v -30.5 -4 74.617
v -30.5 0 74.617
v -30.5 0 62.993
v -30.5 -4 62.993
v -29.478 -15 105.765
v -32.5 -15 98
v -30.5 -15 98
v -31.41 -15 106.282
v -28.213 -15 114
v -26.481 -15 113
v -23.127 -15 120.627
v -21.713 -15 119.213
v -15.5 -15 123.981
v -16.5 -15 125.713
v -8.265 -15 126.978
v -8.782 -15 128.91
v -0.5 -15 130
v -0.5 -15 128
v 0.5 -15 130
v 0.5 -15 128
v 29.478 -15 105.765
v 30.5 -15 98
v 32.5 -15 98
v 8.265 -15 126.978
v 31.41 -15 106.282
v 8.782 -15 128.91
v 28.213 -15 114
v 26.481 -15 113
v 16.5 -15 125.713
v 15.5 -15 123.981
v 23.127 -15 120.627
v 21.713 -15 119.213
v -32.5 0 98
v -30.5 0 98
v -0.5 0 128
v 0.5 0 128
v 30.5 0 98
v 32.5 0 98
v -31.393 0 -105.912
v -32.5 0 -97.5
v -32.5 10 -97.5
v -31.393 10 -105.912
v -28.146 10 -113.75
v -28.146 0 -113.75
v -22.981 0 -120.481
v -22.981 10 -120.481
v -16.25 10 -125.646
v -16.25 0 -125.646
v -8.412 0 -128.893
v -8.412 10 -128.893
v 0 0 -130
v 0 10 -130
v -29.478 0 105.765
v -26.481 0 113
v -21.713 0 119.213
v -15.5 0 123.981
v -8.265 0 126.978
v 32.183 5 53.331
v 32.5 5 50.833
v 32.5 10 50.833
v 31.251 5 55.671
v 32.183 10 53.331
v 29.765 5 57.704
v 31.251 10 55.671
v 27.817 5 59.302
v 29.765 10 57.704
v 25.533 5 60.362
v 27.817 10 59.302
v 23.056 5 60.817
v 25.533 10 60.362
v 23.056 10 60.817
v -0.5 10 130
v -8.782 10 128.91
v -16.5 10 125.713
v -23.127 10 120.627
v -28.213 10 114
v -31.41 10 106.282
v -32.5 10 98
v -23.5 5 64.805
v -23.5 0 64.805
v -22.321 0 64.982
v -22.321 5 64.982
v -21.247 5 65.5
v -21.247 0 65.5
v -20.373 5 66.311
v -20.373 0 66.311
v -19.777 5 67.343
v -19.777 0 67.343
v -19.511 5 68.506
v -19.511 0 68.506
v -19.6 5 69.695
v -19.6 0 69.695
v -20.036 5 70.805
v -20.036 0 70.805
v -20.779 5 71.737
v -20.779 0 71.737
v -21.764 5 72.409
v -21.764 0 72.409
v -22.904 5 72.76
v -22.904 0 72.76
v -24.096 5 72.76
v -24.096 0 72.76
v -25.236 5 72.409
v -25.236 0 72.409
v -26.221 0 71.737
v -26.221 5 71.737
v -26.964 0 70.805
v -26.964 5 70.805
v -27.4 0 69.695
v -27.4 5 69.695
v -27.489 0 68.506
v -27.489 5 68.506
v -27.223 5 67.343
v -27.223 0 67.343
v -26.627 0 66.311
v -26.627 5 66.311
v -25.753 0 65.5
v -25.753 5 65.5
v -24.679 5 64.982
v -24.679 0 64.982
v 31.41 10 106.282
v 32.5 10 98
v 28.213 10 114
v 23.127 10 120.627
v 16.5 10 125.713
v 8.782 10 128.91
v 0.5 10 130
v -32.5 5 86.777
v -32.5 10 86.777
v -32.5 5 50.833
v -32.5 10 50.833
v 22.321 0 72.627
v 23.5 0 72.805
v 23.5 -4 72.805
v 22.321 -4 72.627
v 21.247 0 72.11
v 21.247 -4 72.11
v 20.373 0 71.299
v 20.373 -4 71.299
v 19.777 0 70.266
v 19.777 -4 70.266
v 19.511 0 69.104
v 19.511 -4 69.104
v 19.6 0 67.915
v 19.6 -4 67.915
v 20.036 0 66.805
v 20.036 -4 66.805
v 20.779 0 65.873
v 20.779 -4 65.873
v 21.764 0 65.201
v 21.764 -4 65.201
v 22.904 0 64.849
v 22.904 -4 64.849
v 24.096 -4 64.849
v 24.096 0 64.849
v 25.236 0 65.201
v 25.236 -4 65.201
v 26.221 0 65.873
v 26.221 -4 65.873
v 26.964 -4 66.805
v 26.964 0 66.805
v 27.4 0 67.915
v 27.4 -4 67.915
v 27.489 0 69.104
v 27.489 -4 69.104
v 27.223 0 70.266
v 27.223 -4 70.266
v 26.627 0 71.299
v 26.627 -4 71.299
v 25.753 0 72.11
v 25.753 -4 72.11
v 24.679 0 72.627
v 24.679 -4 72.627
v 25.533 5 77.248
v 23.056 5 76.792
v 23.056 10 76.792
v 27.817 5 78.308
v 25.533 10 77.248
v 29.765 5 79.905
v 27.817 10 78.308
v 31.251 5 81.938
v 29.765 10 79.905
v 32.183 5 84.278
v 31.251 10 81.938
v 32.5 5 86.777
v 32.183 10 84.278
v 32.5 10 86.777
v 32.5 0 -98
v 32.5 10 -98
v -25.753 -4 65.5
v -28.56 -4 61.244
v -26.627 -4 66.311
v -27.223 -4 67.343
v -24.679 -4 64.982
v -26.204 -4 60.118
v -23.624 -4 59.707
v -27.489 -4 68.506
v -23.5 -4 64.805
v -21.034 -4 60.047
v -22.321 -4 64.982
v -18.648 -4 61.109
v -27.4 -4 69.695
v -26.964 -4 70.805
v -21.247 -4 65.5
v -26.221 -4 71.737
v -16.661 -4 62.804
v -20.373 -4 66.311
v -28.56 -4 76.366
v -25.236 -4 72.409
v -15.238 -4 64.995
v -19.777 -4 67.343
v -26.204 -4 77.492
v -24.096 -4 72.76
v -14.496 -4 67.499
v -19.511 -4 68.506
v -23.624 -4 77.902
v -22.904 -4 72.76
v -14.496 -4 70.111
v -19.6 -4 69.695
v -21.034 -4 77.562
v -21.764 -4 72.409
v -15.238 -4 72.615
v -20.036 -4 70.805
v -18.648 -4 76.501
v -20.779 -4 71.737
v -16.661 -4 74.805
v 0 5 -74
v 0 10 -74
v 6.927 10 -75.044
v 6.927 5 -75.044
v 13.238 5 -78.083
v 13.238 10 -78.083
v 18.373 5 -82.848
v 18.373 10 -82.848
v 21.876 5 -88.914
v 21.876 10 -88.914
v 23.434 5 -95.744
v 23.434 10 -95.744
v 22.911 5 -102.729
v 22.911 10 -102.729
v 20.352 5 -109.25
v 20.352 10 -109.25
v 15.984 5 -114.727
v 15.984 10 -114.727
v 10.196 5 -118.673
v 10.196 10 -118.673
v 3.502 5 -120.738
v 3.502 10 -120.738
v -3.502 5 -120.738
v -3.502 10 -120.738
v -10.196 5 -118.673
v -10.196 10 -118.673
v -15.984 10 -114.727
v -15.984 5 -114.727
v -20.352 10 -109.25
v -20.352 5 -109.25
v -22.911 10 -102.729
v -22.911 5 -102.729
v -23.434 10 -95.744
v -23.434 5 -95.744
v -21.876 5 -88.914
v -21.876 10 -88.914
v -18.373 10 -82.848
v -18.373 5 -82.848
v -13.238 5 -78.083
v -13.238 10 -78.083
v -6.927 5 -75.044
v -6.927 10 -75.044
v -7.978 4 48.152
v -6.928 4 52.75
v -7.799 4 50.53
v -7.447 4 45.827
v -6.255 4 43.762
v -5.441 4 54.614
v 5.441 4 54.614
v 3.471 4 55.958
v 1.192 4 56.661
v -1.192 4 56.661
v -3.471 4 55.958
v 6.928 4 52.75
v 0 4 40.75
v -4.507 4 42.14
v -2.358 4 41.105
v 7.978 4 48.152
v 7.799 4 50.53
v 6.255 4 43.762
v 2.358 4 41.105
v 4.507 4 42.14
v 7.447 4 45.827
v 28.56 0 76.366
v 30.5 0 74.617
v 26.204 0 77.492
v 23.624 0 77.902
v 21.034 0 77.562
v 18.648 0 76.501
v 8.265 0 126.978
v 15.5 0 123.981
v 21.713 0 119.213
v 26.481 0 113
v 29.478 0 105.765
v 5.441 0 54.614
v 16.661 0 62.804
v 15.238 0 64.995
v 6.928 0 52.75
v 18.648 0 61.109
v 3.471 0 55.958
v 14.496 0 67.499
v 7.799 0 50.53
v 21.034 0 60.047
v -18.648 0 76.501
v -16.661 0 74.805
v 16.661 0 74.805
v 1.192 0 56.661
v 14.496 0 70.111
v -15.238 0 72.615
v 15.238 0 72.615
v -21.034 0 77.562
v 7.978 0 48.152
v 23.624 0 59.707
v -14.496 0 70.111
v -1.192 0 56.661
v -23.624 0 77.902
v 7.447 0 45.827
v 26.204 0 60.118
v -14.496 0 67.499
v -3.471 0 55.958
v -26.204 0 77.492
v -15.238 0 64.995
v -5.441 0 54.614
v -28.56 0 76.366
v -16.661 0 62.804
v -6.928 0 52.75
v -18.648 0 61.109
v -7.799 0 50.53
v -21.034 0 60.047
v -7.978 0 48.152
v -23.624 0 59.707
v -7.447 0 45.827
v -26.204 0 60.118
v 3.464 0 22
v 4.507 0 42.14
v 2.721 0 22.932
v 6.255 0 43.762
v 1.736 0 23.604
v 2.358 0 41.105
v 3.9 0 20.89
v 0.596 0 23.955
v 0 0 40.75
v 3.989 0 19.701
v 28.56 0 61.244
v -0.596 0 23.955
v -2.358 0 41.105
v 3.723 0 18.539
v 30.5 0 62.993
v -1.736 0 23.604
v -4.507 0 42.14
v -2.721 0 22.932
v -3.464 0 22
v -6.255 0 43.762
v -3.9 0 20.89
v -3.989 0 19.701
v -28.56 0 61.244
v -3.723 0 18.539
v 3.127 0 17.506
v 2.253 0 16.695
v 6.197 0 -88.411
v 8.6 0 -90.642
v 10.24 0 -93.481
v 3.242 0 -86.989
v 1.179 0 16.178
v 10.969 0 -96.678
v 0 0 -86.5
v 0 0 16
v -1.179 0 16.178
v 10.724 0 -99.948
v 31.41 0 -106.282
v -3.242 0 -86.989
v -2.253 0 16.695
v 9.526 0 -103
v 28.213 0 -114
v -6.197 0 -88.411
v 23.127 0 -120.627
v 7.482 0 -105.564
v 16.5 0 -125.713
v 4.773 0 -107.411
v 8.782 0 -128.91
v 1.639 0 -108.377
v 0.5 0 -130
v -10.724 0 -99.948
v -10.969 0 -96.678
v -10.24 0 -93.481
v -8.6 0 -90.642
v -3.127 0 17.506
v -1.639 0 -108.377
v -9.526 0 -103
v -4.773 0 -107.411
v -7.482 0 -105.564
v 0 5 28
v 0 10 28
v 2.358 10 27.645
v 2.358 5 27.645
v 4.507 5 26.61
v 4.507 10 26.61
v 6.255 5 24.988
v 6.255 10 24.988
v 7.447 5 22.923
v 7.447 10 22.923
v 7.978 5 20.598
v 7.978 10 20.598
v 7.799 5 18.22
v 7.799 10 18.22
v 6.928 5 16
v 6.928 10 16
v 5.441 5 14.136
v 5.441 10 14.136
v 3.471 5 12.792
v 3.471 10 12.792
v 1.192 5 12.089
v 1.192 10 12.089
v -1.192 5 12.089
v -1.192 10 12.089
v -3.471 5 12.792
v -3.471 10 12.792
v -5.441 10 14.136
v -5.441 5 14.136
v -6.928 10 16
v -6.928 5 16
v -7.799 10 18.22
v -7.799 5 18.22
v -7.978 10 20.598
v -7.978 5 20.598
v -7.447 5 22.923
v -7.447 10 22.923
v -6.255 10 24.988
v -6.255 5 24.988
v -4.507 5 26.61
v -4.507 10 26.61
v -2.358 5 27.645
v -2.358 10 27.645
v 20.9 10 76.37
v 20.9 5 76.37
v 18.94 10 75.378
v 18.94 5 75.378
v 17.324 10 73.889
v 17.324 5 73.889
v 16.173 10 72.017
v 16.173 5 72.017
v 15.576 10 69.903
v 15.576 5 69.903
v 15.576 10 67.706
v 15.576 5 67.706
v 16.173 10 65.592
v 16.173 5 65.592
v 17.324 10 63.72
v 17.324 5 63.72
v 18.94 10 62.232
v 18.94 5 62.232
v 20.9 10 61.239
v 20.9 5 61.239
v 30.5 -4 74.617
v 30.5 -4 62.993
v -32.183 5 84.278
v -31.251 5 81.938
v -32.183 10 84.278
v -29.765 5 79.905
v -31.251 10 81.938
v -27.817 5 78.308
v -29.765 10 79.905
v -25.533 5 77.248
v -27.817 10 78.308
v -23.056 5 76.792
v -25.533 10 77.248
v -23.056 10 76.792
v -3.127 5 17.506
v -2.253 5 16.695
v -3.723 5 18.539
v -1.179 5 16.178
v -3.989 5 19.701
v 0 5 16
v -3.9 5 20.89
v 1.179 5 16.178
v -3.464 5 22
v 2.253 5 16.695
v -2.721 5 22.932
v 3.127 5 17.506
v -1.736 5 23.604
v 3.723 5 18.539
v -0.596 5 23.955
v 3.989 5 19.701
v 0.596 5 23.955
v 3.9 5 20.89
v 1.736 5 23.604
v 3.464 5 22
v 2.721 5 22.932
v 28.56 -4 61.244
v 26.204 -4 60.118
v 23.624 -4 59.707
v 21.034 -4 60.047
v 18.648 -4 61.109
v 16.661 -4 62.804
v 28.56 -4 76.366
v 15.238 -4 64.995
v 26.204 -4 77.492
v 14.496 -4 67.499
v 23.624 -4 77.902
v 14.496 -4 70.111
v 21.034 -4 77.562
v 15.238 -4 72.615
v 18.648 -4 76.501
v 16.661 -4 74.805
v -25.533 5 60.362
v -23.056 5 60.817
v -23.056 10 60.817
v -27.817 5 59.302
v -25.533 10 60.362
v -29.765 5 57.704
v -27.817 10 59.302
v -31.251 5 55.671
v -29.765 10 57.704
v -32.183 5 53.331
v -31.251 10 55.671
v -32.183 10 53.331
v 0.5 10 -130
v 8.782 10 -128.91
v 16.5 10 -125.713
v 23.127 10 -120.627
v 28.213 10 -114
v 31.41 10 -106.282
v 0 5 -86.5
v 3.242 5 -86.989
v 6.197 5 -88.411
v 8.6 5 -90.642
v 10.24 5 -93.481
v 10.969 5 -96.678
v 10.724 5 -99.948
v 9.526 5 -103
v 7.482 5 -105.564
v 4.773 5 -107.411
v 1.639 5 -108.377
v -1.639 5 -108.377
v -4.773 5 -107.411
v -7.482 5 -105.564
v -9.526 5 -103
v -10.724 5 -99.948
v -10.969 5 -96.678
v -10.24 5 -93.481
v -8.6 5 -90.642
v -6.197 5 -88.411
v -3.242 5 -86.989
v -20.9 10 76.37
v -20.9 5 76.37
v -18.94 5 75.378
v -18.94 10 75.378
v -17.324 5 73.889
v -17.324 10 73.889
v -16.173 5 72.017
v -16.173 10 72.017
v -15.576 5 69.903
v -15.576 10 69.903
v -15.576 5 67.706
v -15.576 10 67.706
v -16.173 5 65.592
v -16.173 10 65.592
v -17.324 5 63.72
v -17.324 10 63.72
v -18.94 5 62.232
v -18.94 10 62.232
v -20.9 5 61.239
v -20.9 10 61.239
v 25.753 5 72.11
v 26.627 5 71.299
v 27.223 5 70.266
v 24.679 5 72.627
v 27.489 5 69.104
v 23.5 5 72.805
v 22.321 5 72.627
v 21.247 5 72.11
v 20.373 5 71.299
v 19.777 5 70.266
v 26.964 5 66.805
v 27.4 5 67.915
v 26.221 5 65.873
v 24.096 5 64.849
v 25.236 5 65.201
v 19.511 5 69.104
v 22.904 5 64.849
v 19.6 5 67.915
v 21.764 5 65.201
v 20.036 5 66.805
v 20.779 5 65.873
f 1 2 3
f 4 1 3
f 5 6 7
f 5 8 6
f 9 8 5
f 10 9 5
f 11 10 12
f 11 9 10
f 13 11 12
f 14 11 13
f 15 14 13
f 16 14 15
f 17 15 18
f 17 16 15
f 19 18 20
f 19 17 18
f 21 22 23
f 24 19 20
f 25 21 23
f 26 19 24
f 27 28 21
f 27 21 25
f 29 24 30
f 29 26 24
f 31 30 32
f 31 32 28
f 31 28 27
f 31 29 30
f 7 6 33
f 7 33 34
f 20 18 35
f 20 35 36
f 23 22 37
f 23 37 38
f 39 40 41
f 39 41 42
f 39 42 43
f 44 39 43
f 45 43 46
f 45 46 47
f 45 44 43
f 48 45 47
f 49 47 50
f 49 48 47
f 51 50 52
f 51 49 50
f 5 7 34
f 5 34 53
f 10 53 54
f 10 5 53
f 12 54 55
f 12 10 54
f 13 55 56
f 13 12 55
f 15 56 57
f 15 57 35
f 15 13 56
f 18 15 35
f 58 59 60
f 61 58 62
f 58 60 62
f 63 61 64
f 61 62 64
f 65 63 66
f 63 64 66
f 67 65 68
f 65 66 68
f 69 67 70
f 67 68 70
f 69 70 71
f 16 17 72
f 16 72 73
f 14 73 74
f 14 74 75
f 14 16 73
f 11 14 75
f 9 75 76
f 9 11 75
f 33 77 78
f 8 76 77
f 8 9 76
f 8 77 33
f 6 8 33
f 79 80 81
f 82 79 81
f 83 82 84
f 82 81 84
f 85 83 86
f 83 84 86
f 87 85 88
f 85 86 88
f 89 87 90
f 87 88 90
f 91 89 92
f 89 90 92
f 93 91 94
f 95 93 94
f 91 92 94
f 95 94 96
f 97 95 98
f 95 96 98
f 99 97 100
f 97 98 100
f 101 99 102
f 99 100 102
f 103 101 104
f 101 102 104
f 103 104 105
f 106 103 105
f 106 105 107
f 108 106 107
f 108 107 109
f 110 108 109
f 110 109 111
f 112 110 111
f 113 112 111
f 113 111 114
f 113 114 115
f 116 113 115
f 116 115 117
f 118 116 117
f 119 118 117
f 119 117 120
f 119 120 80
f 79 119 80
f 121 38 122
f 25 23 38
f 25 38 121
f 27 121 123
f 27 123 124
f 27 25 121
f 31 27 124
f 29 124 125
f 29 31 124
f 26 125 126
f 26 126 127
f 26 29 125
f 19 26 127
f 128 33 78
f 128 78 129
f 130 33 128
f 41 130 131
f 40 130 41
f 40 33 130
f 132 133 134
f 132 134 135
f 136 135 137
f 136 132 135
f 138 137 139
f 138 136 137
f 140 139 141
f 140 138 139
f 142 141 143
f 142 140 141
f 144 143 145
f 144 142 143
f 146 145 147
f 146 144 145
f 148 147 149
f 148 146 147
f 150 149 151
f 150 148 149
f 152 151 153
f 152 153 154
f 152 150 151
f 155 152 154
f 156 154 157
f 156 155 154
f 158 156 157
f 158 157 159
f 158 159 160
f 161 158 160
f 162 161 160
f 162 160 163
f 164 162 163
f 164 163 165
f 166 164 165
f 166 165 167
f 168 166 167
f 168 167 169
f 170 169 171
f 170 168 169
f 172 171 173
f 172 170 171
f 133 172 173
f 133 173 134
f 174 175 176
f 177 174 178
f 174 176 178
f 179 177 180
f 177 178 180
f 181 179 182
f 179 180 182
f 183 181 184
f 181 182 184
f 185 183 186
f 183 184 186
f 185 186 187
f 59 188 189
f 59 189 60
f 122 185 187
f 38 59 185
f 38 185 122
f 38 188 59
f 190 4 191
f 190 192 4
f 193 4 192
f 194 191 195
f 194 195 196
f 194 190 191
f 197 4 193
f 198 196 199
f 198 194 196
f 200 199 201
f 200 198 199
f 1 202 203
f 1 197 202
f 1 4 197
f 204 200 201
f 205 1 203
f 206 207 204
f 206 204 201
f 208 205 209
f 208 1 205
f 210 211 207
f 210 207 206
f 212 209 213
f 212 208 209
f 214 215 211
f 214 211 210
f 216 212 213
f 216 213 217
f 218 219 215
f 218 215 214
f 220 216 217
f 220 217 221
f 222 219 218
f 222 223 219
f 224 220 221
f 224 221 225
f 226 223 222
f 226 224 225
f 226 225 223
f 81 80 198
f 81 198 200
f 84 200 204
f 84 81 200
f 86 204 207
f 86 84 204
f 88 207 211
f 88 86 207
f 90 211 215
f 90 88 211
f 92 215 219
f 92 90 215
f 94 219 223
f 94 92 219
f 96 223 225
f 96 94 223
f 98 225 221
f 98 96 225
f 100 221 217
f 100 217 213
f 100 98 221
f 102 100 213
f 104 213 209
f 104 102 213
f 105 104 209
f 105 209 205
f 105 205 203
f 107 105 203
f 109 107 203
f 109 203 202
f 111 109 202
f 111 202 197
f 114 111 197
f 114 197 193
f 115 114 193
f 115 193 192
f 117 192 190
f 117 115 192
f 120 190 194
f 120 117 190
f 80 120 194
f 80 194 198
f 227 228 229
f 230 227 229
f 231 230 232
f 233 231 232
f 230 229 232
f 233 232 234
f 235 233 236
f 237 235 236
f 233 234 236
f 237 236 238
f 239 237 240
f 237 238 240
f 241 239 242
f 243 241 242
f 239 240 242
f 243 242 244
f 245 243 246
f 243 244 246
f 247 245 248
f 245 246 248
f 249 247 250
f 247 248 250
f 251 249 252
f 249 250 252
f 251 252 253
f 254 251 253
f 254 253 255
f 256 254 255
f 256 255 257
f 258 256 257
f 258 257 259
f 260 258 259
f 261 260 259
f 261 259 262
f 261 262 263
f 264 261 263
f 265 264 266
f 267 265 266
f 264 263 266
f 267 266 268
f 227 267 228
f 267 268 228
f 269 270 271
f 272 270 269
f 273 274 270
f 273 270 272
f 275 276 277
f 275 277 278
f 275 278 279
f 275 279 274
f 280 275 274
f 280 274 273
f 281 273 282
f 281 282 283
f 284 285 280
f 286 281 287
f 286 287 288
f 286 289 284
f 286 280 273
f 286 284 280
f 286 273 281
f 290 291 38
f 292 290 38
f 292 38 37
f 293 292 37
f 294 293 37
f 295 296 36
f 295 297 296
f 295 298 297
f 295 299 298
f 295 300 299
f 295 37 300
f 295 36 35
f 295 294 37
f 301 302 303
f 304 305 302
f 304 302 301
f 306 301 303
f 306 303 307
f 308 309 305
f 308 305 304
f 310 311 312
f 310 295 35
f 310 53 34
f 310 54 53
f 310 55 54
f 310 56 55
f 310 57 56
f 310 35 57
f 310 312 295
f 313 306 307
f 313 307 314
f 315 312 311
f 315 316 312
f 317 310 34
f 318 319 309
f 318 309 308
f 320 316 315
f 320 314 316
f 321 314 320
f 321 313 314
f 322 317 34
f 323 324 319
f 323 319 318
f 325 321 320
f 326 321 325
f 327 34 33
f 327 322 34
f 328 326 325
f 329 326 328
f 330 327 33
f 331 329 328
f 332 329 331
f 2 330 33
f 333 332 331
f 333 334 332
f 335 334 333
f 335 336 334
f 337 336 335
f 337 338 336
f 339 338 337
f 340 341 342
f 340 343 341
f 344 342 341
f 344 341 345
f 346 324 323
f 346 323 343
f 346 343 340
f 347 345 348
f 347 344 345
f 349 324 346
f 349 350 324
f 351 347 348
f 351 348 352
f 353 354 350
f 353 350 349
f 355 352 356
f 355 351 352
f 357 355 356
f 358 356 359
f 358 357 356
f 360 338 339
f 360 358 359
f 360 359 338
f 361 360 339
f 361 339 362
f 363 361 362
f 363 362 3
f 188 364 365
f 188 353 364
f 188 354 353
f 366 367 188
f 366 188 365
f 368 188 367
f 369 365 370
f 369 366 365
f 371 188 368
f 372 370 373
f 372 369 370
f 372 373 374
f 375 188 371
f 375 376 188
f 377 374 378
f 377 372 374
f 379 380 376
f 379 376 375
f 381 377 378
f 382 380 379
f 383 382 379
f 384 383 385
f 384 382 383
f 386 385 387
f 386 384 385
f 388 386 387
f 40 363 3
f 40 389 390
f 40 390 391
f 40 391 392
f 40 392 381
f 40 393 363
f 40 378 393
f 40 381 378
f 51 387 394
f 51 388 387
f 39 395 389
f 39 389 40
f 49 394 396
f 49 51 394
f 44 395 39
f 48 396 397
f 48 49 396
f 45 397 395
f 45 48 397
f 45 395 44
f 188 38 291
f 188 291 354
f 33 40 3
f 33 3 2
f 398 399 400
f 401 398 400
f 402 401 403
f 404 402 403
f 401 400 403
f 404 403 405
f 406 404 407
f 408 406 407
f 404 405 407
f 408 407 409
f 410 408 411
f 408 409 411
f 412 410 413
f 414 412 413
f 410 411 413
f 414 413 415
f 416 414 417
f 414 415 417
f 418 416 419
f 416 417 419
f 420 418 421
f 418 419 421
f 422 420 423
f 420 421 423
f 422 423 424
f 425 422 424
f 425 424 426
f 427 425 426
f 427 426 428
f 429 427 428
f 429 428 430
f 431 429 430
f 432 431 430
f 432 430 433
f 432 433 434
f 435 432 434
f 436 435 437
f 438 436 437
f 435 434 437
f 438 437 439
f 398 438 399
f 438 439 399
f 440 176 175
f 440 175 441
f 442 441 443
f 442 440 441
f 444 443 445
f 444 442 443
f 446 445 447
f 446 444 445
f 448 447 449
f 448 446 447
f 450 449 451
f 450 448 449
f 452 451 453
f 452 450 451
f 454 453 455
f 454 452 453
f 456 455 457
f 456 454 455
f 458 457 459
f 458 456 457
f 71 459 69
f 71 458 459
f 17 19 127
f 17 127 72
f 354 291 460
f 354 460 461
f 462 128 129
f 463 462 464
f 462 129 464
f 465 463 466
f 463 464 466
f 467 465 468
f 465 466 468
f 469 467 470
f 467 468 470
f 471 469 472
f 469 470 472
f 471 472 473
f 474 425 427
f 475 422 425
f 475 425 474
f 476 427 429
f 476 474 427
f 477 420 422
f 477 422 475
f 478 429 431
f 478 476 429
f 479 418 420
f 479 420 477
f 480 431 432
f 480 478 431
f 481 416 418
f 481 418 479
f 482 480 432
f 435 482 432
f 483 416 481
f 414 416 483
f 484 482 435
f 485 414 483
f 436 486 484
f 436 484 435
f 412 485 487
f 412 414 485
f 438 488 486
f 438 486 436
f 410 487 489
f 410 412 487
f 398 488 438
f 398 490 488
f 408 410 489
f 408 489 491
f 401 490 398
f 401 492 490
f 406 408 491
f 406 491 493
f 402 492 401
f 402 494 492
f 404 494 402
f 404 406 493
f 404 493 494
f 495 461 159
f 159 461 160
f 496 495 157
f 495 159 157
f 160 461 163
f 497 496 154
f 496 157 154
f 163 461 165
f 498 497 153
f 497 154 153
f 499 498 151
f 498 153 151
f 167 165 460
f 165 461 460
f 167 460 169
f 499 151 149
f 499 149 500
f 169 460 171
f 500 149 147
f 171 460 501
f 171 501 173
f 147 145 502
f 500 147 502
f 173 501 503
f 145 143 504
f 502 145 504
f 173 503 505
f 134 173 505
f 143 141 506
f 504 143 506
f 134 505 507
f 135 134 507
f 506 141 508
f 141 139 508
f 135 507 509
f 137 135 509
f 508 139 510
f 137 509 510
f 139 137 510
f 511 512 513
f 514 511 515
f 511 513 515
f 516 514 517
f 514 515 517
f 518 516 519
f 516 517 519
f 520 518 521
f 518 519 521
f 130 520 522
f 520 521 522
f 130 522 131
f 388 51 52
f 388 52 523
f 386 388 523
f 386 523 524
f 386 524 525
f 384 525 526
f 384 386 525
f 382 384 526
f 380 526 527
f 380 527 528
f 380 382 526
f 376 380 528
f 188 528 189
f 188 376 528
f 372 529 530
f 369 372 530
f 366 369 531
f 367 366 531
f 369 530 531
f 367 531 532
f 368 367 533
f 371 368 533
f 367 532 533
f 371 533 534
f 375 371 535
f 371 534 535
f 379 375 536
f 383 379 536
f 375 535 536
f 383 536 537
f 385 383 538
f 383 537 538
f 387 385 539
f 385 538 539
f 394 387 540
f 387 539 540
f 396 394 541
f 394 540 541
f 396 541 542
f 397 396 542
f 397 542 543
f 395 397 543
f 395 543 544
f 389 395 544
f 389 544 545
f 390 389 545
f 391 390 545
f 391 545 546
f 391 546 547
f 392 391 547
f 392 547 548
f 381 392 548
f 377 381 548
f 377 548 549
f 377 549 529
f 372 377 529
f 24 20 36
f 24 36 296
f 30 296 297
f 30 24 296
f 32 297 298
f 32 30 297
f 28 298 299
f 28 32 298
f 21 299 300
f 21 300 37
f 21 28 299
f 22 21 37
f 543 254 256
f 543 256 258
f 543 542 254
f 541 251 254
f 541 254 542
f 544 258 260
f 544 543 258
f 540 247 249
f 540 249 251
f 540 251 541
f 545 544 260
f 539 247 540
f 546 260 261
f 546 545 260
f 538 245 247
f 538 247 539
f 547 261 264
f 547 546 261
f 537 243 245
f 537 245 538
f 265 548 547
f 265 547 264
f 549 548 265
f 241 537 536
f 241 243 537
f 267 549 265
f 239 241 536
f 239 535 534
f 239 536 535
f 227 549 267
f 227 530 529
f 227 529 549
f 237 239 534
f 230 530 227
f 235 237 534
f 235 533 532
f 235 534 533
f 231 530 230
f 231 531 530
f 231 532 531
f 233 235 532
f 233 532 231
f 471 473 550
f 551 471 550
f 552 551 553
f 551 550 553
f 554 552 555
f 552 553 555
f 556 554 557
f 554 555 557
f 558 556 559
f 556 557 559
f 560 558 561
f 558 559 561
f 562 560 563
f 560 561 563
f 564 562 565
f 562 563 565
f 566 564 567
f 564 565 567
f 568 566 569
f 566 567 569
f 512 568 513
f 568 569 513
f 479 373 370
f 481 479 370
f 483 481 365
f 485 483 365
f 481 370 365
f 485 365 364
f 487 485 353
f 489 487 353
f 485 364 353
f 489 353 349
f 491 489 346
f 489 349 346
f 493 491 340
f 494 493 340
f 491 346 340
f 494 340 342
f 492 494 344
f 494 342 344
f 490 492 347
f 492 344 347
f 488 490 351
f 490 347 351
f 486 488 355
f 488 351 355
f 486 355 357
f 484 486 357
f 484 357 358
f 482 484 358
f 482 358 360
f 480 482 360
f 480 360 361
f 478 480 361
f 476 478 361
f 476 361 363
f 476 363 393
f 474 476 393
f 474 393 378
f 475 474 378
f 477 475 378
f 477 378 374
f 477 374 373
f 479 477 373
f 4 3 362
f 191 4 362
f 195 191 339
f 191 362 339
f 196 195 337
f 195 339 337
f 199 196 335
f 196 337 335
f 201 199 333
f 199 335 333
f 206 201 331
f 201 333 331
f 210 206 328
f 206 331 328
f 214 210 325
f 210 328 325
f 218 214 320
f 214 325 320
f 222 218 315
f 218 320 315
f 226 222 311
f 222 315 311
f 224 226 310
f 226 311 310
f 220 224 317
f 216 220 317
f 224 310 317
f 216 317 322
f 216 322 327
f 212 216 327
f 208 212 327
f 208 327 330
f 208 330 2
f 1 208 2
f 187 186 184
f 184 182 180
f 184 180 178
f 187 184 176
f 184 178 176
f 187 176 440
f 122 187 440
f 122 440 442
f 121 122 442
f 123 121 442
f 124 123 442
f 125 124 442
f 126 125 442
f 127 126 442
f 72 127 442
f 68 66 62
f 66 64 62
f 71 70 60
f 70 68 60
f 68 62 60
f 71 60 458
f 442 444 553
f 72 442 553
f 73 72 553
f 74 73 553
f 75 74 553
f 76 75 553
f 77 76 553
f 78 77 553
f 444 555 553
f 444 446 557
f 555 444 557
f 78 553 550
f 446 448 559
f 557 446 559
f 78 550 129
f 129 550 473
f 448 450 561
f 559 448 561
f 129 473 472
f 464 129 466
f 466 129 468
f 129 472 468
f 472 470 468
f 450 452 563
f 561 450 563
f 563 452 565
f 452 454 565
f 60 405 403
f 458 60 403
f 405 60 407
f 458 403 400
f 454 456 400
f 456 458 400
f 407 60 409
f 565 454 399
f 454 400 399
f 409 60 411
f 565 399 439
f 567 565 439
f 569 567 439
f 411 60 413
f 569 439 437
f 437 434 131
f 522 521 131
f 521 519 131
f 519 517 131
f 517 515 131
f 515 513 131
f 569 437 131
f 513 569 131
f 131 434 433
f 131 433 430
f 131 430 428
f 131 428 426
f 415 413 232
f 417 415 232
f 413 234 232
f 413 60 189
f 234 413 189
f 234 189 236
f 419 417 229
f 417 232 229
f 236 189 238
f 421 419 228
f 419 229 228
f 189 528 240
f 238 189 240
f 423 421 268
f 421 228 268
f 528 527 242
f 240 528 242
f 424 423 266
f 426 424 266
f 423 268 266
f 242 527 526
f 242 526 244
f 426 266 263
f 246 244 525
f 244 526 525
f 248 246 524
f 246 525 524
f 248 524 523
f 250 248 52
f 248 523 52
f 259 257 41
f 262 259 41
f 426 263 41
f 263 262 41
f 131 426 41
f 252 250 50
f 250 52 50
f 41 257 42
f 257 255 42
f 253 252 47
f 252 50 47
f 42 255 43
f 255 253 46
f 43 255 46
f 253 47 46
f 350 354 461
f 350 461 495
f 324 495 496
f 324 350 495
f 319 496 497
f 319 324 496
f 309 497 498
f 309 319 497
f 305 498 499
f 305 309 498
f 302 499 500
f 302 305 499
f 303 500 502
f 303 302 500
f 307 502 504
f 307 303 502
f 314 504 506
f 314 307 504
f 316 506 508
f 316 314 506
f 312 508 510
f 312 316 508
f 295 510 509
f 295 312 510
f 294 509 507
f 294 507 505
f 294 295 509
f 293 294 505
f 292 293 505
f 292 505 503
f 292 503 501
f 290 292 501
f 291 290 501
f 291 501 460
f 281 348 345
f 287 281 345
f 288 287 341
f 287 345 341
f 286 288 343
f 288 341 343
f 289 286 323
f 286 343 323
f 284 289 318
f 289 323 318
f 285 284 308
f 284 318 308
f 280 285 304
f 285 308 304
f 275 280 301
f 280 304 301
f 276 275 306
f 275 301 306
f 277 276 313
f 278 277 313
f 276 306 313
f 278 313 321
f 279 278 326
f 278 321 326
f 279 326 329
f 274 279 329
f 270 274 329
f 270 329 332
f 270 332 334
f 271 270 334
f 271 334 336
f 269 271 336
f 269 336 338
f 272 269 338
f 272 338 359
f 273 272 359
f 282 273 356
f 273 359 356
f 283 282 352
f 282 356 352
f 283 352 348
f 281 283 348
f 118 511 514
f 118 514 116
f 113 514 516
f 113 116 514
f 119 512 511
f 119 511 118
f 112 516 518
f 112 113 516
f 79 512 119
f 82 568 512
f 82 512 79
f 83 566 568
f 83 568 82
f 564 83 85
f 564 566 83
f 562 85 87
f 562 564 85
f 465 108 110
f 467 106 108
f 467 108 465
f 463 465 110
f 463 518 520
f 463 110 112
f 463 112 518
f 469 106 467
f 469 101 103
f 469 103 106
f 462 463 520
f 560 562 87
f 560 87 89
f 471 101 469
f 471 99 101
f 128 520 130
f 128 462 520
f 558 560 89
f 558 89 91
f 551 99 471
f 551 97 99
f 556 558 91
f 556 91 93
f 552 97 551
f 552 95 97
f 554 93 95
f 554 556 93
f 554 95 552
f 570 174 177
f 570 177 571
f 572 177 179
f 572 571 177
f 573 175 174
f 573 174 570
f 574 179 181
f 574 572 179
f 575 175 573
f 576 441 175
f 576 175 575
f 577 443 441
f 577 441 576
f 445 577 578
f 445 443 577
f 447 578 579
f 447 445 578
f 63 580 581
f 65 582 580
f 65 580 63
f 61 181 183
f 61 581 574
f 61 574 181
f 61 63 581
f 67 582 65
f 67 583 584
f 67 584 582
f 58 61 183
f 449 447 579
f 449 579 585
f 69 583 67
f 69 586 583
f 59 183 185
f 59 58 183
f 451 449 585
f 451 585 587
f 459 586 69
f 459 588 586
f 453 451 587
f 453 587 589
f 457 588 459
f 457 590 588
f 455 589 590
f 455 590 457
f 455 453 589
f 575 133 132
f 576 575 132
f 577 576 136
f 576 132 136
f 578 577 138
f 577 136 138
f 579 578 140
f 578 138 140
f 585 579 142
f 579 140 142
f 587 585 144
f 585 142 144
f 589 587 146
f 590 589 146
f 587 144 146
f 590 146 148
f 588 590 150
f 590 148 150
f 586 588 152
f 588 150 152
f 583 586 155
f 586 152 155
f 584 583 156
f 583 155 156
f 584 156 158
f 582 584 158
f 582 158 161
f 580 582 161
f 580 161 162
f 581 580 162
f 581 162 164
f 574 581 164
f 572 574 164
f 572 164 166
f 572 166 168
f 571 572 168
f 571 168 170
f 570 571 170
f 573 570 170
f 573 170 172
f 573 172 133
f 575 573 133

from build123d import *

# Parameters (mm, degrees)
BOSS_EXTRUDE1_DEPTH = 10
SKETCH2_R           = 23.5
CUT_EXTRUDE1_DEPTH  = 5
SKETCH3_R           = 11
CUT_EXTRUDE2_DEPTH  = 135.094183319
SKETCH22_R          = 8
CUT_EXTRUDE15_DEPTH = 4
SKETCH23_R          = 4
BOSS_EXTRUDE6_DEPTH = 4
SKETCH24_R          = 4
CUT_EXTRUDE16_DEPTH = 135.373546504
BOSS_EXTRUDE7_START = 15
BOSS_EXTRUDE7_DEPTH = 15
SKETCH26_R          = 8
CUT_EXTRUDE17_DEPTH = 5
FILLET1_R           = 10
FILLET2_R           = 10


with BuildPart() as part:
    # Sketch1 → Boss-Extrude1 (new body)
    with BuildSketch(Plane(origin=(0, 0, 0), x_dir=(1, 0, 0), z_dir=(0, 1, 0))):
        with BuildLine():
            Line((0, 130), (0.5, 130))
            ThreePointArc((0.5, 130), (23.127416998, 120.627416998), (32.5, 98))
            Line((32.5, 98), (32.5, -98))
            ThreePointArc((32.5, -98), (23.127416998, -120.627416998), (0.5, -130))
            Line((0.5, -130), (-0.5, -130))
            ThreePointArc((-0.5, -130), (-23.127416998, -120.627416998), (-32.5, -98))
            Line((-32.5, -98), (-32.5, 97.5))
            ThreePointArc((-32.5, 97.5), (-22.980970389, 120.480970389), (0, 130))
        make_face()
    extrude(amount=BOSS_EXTRUDE1_DEPTH)

    # Sketch2 → Cut-Extrude1 (cut)
    with BuildSketch(Plane(origin=(0, 10, 0), x_dir=(1, 0, 0), z_dir=(0, 1, 0))):
        with Locations(Location((0, 97.5, 0), (0, 0, 270))):
            Circle(SKETCH2_R)
    extrude(amount=-CUT_EXTRUDE1_DEPTH, mode=Mode.SUBTRACT)

    # Sketch3 → Cut-Extrude2 (cut, through all)
    with BuildSketch(Plane(origin=(0, 5, 0), x_dir=(1, 0, 0), z_dir=(0, 1, 0))):
        with Locations(Location((0, 97.5, 0), (0, 0, 270))):
            Circle(SKETCH3_R)
    extrude(amount=-CUT_EXTRUDE2_DEPTH, mode=Mode.SUBTRACT)

    # Sketch22 → Cut-Extrude15 (cut)
    with BuildSketch(Plane.XZ):
        with Locations(Location((0, 48.75, 0), (0, 0, 270))):
            Circle(SKETCH22_R)
    extrude(amount=-CUT_EXTRUDE15_DEPTH, mode=Mode.SUBTRACT)

    # Sketch23 → Boss-Extrude6 (add)
    # profile 1 of 2: a face of its own
    with BuildSketch(Plane.XZ):
        with BuildLine():
            Line((-30.5, 74.616516124), (-30.5, 62.993052049))
            ThreePointArc((-30.5, 62.993052049), (-14.401855723, 68.804784086), (-30.5, 74.616516124))
        make_face()
        with Locations(Location((-23.5, 68.804784086, 0), (0, 0, 270))):
            Circle(SKETCH23_R, mode=Mode.SUBTRACT)
    # profile 2 of 2: a face of its own
    with BuildSketch(Plane.XZ):
        with BuildLine():
            Line((30.5, 74.616516124), (30.5, 62.993052049))
            ThreePointArc((30.5, 62.993052049), (14.401855723, 68.804784086), (30.5, 74.616516124))
        make_face()
        with Locations(Location((23.5, 68.804784086, 0), (0, 0, 90))):
            Circle(SKETCH23_R, mode=Mode.SUBTRACT)
    extrude(amount=BOSS_EXTRUDE6_DEPTH)

    # Sketch24 → Cut-Extrude16 (cut, through all)
    with BuildSketch(Plane.XZ):
        with Locations(Location((0, 20, 0), (0, 0, 270))):
            Circle(SKETCH24_R)
        with Locations(Location((-23.5, 68.804784086, 0), (0, 0, 270))):
            Circle(SKETCH24_R)
        with Locations(Location((23.5, 68.804784086, 0), (0, 0, 90))):
            Circle(SKETCH24_R)
    extrude(amount=-CUT_EXTRUDE16_DEPTH, mode=Mode.SUBTRACT)

    # Sketch25 → Boss-Extrude7 (add)
    with BuildSketch(Plane.XZ.offset(BOSS_EXTRUDE7_START)):
        with BuildLine():
            Line((-32.5, 98), (-30.5, 98))
            ThreePointArc((-30.5, 98), (-21.713203436, 119.213203436), (-0.5, 128))
            Line((-0.5, 128), (0.5, 128))
            ThreePointArc((0.5, 128), (21.713203436, 119.213203436), (30.5, 98))
            Line((30.5, 98), (32.5, 98))
            ThreePointArc((32.5, 98), (23.127416998, 120.627416998), (0.5, 130))
            Line((0.5, 130), (-0.5, 130))
            ThreePointArc((-0.5, 130), (-23.127416998, 120.627416998), (-32.5, 98))
        make_face()
    extrude(amount=-BOSS_EXTRUDE7_DEPTH)

    # Sketch26 → Cut-Extrude17 (cut)
    with BuildSketch(Plane(origin=(0, 10, 0), x_dir=(1, 0, 0), z_dir=(0, 1, 0))):
        with Locations(Location((0, -20, 0), (0, 0, 270))):
            Circle(SKETCH26_R)
        with BuildLine():
            Line((-23.5, -60.804784086), (-32.5, -60.804784086))
            Line((-32.5, -60.804784086), (-32.5, -76.804784086))
            Line((-32.5, -76.804784086), (-23.5, -76.804784086))
            ThreePointArc((-23.5, -76.804784086), (-15.5, -68.804784086), (-23.5, -60.804784086))
        make_face()
        with BuildLine():
            Line((23.5, -60.804784086), (32.5, -60.804784086))
            Line((32.5, -60.804784086), (32.5, -76.804784086))
            Line((32.5, -76.804784086), (23.5, -76.804784086))
            ThreePointArc((23.5, -76.804784086), (15.5, -68.804784086), (23.5, -60.804784086))
        make_face()
    extrude(amount=-CUT_EXTRUDE17_DEPTH, mode=Mode.SUBTRACT)

    # Fillet1
    # the kernel refuses this fillet: 10 mm, written as the material it takes off along each edge
    with BuildSketch(Plane(origin=(-32.5, 34.930501889, 76.804784086), x_dir=(0, 0, 1), z_dir=(0, -1, 0))) as fillet1_piece_1:
        with BuildLine():
            CenterArc((9.972200756, -10), FILLET1_R, 90, 86.815261463)
            Line((-0.01235522, -9.444444444), (-1.010810817, -9.388888889))
            ThreePointArc((-1.010810817, -9.388888889), (-1, -9), (-1, 0))
            Line((-1, 0), (0, 1))
            Line((0, 1), (9.972200756, 1))
            Line((9.972200756, 1), (9.972200756, 0))
        make_face()
    extrude(amount=29.930501889, mode=Mode.SUBTRACT)
    with BuildSketch(Plane(origin=(-32.5, 34.930501889, 60.804784086), x_dir=(0, 0, -1), z_dir=(0, -1, 0))) as fillet1_piece_2:
        with BuildLine():
            CenterArc((9.972200756, 10), FILLET1_R, 183.184738537, 86.815261463)
            Line((-0.01235522, 9.444444444), (-1.010810817, 9.388888889))
            ThreePointArc((-1.010810817, 9.388888889), (-1, 9), (-1, 0))
            Line((-1, 0), (0, -1))
            Line((0, -1), (9.972200756, -1))
            Line((9.972200756, -1), (9.972200756, 0))
        make_face()
    extrude(amount=29.930501889, mode=Mode.SUBTRACT)

    # Fillet2
    # the kernel refuses this fillet: 10 mm, written as the material it takes off along each edge
    with BuildSketch(Plane(origin=(32.5, 34.930501889, 76.804784086), x_dir=(0, 0, 1), z_dir=(0, -1, 0))) as fillet2_piece_1:
        with BuildLine():
            CenterArc((9.972200756, 10), FILLET2_R, 183.184738537, 86.815261463)
            Line((-0.01235522, 9.444444444), (-1.010810817, 9.388888889))
            ThreePointArc((-1.010810817, 9.388888889), (-1, 9), (-1, 0))
            Line((-1, 0), (0, -1))
            Line((0, -1), (9.972200756, -1))
            Line((9.972200756, -1), (9.972200756, 0))
        make_face()
    extrude(amount=29.930501889, mode=Mode.SUBTRACT)
    with BuildSketch(Plane(origin=(32.5, 34.930501889, 60.804784086), x_dir=(0, 0, -1), z_dir=(0, -1, 0))) as fillet2_piece_2:
        with BuildLine():
            CenterArc((9.972200756, -10), FILLET2_R, 90, 86.815261463)
            Line((-0.01235522, -9.444444444), (-1.010810817, -9.388888889))
            ThreePointArc((-1.010810817, -9.388888889), (-1, -9), (-1, 0))
            Line((-1, 0), (0, 1))
            Line((0, 1), (9.972200756, 1))
            Line((9.972200756, 1), (9.972200756, 0))
        make_face()
    extrude(amount=29.930501889, mode=Mode.SUBTRACT)


solid = part.part
